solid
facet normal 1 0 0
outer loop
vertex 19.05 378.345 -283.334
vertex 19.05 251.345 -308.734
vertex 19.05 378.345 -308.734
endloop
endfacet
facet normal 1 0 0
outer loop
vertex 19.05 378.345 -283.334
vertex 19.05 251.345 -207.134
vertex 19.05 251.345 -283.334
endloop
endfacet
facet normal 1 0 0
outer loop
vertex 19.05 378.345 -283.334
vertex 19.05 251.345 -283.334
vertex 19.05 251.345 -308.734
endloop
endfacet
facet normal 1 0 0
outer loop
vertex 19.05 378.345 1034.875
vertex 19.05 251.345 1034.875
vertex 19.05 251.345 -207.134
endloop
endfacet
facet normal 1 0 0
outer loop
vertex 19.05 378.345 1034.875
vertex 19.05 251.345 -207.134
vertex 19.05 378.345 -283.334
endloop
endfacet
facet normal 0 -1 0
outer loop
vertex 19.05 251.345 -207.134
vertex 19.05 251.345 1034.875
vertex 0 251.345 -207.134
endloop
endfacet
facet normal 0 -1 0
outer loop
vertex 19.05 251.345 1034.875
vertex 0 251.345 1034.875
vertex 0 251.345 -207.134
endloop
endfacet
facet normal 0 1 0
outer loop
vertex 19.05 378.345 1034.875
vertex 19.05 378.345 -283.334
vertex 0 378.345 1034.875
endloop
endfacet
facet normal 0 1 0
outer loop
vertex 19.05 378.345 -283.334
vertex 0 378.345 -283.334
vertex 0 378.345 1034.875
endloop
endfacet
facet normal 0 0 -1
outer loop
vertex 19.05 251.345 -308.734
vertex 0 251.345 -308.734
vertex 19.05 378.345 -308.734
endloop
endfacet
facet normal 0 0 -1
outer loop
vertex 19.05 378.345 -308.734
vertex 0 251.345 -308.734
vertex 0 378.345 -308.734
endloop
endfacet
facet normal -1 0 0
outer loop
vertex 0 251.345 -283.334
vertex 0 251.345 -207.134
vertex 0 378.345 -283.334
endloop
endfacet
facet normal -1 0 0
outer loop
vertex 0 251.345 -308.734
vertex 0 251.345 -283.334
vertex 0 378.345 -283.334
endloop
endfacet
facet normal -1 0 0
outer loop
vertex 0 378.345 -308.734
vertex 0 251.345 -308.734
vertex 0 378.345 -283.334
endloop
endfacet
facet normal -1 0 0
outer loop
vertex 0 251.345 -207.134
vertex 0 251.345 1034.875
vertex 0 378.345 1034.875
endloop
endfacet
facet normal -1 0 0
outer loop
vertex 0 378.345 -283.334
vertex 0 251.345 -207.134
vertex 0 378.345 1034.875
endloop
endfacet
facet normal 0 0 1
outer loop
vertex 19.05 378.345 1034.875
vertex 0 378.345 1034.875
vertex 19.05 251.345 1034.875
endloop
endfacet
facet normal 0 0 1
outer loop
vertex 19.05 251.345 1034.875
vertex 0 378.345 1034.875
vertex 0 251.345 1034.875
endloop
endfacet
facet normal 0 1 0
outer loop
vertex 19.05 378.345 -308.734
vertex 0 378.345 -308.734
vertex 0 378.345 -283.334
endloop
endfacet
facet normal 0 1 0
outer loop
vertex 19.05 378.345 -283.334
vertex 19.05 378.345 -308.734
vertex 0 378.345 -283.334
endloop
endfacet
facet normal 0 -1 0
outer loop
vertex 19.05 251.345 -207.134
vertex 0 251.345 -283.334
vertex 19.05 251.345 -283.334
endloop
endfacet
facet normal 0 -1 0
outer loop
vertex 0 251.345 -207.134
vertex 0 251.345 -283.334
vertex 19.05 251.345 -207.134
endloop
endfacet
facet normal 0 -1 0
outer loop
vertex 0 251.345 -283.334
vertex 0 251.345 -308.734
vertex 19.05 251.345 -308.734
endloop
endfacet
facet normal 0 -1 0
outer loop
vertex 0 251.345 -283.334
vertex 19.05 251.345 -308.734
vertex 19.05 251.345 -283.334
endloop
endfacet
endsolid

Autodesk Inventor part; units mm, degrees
ref_plane "YZ Plane" through (0, 0, 0) normal (1, 0, 0) x (0, 1, 0)
ref_plane "XZ Plane" through (0, 0, 0) normal (0, 1, 0) x (-1, 0, 0)
ref_plane "XY Plane" through (0, 0, 0) normal (0, 0, 1) x (1, 0, 0)
sketch "Sketch1" plane through (0, 0, 0) normal (1, 0, 0) x (0, 1, 0)
  line L0 (397.3949, -308.7342) -> (378.3449, -308.7342) projected
  line L1 (251.3449, -308.7342) -> (378.3449, -308.7342) projected
  line L2 (378.3449, -308.7342) -> (378.3449, -283.3342) projected
  line L3 (251.3449, -308.7342) -> (251.3449, -283.3342) projected
  line L4 (251.3449, -283.3342) -> (251.3449, -207.1342) projected
  line L5 (251.3449, -308.7342) -> (378.3449, -308.7342)
  line L6 (378.3449, 1034.875) -> (397.3949, 1034.875) projected
  line L7 (378.3449, 1034.875) -> (251.3449, 1034.875)
  line L8 (251.3449, 1034.875) -> (251.3449, -308.7342)
  line L9 (251.3449, -308.7342) -> (378.3449, -308.7342)
  line L10 (378.3449, -308.7342) -> (378.3449, 1034.875)
  point P0 (0, 0)
  point P1 (270.3949, -283.3342)
  point P2 (270.3949, -207.1342)
extrude "Extrusion1" add sketch "Sketch1" along normal blind 19.05
properties part number "wheel mount front"
